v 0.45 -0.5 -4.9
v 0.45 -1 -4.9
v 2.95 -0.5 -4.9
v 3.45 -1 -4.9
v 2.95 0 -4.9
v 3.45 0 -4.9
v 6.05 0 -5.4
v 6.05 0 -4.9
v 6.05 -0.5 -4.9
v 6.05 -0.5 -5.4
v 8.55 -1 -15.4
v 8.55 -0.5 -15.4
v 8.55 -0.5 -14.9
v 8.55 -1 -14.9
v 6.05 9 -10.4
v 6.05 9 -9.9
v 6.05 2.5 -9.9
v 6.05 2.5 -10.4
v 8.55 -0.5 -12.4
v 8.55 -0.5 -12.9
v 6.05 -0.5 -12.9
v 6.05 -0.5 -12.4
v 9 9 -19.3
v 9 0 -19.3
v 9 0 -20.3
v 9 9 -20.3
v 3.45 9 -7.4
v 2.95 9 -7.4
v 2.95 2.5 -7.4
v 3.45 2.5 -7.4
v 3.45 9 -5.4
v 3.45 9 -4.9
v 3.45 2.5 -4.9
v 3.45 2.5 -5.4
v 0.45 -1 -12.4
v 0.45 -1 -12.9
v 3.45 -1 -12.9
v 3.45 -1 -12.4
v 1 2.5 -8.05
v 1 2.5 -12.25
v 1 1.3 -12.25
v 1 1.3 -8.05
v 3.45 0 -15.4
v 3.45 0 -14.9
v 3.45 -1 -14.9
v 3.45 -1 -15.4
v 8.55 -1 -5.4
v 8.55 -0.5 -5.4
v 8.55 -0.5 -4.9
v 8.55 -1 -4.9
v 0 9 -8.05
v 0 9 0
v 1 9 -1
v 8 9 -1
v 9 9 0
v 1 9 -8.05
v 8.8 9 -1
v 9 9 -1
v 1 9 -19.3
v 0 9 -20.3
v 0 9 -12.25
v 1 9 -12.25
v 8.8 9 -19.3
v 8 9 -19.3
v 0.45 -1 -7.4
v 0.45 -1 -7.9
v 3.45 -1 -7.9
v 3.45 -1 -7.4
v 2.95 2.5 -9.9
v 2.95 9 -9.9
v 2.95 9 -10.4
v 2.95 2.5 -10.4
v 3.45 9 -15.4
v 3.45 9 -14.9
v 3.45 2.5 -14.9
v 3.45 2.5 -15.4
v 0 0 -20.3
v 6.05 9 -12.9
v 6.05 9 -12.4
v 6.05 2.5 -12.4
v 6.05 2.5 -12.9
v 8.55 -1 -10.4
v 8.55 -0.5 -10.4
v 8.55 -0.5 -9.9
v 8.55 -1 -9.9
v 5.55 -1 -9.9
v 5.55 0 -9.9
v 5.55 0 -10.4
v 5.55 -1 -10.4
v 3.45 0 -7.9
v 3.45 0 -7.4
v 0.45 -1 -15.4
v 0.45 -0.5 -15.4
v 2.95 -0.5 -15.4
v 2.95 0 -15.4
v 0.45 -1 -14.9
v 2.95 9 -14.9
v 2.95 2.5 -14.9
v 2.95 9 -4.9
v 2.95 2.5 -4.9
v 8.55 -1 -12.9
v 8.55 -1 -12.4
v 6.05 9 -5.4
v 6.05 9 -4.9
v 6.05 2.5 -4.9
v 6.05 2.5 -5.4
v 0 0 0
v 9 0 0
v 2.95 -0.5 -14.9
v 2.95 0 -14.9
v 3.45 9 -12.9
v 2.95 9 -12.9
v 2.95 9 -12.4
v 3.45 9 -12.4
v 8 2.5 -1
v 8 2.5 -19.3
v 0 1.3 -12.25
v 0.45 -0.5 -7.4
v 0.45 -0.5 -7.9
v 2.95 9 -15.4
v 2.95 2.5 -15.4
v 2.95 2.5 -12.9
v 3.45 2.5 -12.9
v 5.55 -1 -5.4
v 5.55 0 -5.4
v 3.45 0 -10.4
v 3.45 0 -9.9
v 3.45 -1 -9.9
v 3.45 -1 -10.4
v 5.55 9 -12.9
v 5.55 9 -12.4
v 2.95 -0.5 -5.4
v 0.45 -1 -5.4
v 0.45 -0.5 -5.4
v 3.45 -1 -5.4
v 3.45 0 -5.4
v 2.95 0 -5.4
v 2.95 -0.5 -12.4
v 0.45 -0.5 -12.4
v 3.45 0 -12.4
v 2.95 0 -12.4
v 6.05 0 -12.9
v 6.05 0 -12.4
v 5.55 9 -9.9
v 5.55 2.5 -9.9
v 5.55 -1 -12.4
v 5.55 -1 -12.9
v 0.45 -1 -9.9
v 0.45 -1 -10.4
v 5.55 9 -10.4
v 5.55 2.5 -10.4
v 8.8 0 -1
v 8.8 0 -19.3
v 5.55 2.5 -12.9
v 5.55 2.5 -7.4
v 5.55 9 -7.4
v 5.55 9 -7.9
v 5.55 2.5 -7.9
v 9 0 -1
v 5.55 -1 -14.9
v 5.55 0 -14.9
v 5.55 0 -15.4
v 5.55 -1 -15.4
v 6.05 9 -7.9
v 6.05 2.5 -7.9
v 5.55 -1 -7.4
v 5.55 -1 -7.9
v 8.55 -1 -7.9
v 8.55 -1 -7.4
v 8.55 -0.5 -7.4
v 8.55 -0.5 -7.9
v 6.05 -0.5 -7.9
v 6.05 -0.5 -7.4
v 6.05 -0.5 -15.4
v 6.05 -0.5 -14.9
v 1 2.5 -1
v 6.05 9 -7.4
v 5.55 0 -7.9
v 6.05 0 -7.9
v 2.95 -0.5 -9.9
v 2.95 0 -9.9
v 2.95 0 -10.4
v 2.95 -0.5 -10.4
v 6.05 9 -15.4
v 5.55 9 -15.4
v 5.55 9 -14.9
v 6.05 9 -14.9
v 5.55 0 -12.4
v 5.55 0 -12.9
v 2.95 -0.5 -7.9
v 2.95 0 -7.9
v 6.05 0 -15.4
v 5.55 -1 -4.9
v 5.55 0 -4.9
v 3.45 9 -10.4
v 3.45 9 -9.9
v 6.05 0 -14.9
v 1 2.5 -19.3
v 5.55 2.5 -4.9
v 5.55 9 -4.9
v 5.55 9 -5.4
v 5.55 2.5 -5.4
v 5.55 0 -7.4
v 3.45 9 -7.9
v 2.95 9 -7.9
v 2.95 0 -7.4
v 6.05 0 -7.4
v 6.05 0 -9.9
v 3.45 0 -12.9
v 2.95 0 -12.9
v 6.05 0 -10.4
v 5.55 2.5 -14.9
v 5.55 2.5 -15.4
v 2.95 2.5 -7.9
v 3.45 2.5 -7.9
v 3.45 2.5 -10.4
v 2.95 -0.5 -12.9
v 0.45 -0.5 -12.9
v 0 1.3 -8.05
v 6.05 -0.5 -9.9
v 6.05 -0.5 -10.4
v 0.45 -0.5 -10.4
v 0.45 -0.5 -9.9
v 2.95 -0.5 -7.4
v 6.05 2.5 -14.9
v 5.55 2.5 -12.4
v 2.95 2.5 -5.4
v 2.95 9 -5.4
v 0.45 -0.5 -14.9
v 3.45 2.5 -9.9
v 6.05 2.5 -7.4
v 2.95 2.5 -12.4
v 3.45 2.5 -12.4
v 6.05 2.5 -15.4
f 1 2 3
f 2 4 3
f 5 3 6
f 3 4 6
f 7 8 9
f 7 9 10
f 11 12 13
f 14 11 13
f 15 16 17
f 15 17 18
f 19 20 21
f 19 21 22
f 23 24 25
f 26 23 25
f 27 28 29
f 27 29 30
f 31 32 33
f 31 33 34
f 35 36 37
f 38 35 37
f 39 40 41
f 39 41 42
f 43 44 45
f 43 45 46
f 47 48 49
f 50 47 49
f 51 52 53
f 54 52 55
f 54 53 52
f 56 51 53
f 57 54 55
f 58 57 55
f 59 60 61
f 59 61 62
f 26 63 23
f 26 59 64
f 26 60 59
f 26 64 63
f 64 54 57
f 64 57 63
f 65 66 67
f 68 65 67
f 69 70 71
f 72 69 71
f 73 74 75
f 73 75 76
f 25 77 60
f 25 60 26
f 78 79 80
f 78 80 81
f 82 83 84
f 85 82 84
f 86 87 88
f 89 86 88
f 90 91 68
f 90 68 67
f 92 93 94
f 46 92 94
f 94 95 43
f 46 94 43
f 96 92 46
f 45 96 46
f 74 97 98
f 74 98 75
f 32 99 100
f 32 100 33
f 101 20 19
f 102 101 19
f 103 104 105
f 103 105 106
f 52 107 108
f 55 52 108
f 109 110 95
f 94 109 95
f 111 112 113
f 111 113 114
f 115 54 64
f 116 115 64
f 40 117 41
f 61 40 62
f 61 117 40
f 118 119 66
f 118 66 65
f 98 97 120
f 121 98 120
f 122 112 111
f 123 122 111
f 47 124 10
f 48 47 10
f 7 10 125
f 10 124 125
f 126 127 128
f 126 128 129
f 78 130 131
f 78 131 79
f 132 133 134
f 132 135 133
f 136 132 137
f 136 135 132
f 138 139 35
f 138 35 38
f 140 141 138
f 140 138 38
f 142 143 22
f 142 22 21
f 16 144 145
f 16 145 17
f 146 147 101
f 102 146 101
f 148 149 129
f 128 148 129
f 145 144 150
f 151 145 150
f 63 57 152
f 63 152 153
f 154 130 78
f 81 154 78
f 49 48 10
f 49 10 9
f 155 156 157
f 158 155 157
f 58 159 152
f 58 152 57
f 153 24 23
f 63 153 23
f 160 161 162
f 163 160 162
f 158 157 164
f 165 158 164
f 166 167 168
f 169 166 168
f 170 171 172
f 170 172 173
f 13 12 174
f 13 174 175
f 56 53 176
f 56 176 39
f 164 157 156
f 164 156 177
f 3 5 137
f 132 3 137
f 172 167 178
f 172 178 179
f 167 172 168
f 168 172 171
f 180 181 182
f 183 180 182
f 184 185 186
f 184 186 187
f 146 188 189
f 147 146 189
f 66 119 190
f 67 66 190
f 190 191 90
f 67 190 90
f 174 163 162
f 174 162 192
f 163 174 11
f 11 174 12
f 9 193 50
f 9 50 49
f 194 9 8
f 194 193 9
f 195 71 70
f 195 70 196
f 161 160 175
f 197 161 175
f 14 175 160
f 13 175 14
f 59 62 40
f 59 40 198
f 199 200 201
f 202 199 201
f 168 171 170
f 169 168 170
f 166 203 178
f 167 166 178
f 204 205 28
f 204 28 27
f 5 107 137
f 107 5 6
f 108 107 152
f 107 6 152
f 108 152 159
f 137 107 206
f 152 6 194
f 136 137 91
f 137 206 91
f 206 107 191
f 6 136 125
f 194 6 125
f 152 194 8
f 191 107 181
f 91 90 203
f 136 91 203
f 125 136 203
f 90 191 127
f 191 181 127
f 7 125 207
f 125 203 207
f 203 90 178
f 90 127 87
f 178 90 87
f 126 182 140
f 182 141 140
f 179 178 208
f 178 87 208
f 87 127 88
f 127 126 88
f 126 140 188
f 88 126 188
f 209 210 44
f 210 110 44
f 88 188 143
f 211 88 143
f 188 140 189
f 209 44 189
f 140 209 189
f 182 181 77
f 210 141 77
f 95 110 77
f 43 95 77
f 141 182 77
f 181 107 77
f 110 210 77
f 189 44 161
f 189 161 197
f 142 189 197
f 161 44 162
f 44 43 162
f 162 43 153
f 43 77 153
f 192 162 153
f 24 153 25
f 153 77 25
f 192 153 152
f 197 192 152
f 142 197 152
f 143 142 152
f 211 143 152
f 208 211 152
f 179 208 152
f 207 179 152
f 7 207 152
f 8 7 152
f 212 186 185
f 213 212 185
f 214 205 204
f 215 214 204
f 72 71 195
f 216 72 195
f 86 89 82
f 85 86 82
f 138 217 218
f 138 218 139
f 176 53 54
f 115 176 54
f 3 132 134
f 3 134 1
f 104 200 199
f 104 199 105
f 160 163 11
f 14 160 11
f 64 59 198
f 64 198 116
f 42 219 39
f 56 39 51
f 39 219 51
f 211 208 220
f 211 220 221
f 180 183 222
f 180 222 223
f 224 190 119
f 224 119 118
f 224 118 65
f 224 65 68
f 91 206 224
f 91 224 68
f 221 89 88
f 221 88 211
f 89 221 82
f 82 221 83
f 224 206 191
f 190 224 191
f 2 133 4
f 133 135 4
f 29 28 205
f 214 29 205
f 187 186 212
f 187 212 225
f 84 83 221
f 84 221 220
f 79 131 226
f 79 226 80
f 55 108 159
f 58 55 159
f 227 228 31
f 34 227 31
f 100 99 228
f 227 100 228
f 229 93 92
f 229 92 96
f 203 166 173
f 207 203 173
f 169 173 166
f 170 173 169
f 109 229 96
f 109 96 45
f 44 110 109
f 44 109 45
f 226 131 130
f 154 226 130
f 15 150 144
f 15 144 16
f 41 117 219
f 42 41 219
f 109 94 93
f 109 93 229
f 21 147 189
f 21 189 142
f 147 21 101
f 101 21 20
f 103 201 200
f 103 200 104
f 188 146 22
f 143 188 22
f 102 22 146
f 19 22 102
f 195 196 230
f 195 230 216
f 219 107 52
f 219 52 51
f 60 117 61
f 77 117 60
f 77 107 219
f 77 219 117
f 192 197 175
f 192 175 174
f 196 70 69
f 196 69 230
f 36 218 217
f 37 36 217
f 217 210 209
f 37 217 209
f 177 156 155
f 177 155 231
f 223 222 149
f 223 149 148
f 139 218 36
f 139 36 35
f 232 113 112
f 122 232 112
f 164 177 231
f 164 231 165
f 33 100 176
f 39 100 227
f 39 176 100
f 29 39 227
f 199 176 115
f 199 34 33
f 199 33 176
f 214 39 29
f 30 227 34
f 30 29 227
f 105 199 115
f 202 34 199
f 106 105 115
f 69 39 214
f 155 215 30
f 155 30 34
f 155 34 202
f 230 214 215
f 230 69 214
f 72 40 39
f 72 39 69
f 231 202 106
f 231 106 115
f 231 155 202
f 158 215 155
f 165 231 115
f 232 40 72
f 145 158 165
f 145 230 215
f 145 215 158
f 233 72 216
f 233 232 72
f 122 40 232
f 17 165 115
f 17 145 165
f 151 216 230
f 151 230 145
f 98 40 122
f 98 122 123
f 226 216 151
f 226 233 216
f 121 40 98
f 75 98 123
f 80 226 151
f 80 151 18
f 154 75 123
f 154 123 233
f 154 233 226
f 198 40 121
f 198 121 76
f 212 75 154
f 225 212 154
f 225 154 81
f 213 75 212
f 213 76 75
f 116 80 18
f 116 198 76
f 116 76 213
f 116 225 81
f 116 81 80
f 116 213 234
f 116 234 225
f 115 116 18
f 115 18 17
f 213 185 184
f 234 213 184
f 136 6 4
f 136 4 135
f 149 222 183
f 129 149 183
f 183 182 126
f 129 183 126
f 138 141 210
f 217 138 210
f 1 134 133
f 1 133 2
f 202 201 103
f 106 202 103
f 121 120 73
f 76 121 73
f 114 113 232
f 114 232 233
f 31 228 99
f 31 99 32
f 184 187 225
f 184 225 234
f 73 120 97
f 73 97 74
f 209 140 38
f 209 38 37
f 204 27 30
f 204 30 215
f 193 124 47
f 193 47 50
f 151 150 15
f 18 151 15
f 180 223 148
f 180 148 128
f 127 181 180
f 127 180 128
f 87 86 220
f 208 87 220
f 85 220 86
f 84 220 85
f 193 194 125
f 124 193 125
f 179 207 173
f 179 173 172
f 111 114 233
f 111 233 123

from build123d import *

# Parameters (mm, degrees)
CROQUIS1_W              = 9
CROQUIS1_H              = 20.3
SALIENTE_EXTRUIR1_DEPTH = 9
CROQUIS2_W              = 7
CROQUIS2_H              = 18.3
CORTAR_EXTRUIR1_DEPTH   = 6.5
CROQUIS3_W              = 18.3
CROQUIS3_H              = 9
CORTAR_EXTRUIR2_DEPTH   = 0.2
CROQUIS4_W              = 4.2
CROQUIS4_H              = 7.7
CORTAR_EXTRUIR3_DEPTH   = 1
CROQUIS5_W              = 0.5
CROQUIS5_H              = 0.5
SALIENTE_EXTRUIR2_DEPTH = 10
CROQUIS6_W              = 0.5
CROQUIS6_H              = 0.5
SALIENTE_EXTRUIR3_DEPTH = 2.5


with BuildPart() as part:
    # Croquis1 → Saliente-Extruir1 (new body)
    with BuildSketch(Plane(origin=(0, 0, 0), x_dir=(1, 0, 0), z_dir=(0, 1, 0))):
        with Locations((4.5, 10.15)):
            Rectangle(CROQUIS1_W, CROQUIS1_H)
    extrude(amount=SALIENTE_EXTRUIR1_DEPTH)

    # Croquis2 → Cortar-Extruir1 (cut)
    with BuildSketch(Plane(origin=(0, 9, 0), x_dir=(1, 0, 0), z_dir=(0, 1, 0))):
        with Locations((4.5, 10.15)):
            Rectangle(CROQUIS2_W, CROQUIS2_H)
    extrude(amount=-CORTAR_EXTRUIR1_DEPTH, mode=Mode.SUBTRACT)

    # Croquis3 → Cortar-Extruir2 (cut)
    with BuildSketch(Plane(origin=(9, 0, 0), x_dir=(0, 0, -1), z_dir=(1, 0, 0))):
        with Locations((10.15, 4.5)):
            Rectangle(CROQUIS3_W, CROQUIS3_H)
    extrude(amount=-CORTAR_EXTRUIR2_DEPTH, mode=Mode.SUBTRACT)

    # Croquis4 → Cortar-Extruir3 (cut)
    with BuildSketch(Plane.ZY):
        with Locations((-10.15, 5.15)):
            Rectangle(CROQUIS4_W, CROQUIS4_H)
    extrude(amount=-CORTAR_EXTRUIR3_DEPTH, mode=Mode.SUBTRACT)

    # Croquis5 → Saliente-Extruir2 (add)
    with BuildSketch(Plane(origin=(0, 9, 0), x_dir=(1, 0, 0), z_dir=(0, 1, 0))):
        with Locations((5.8, 15.15)):
            Rectangle(CROQUIS5_W, CROQUIS5_H)
        with Locations((3.2, 15.15)):
            Rectangle(CROQUIS5_W, CROQUIS5_H)
        with Locations((5.8, 12.65)):
            Rectangle(CROQUIS5_W, CROQUIS5_H)
        with Locations((5.8, 10.15)):
            Rectangle(CROQUIS5_W, CROQUIS5_H)
        with Locations((5.8, 7.65)):
            Rectangle(CROQUIS5_W, CROQUIS5_H)
        with Locations((5.8, 5.15)):
            Rectangle(CROQUIS5_W, CROQUIS5_H)
        with Locations((3.2, 12.65)):
            Rectangle(CROQUIS5_W, CROQUIS5_H)
        with Locations((3.2, 10.15)):
            Rectangle(CROQUIS5_W, CROQUIS5_H)
        with Locations((3.2, 7.65)):
            Rectangle(CROQUIS5_W, CROQUIS5_H)
        with Locations((3.2, 5.15)):
            Rectangle(CROQUIS5_W, CROQUIS5_H)
    extrude(amount=-SALIENTE_EXTRUIR2_DEPTH)

    # Croquis6 → Saliente-Extruir3 (add)
    with BuildSketch(Plane.ZY.offset(-2.95)):
        with Locations((-5.15, -0.75)):
            Rectangle(CROQUIS6_W, CROQUIS6_H)
        with Locations((-7.65, -0.75)):
            Rectangle(CROQUIS6_W, CROQUIS6_H)
        with Locations((-10.15, -0.75)):
            Rectangle(CROQUIS6_W, CROQUIS6_H)
        with Locations((-12.65, -0.75)):
            Rectangle(CROQUIS6_W, CROQUIS6_H)
        with Locations((-15.15, -0.75)):
            Rectangle(CROQUIS6_W, CROQUIS6_H)
    saliente_extruir3 = extrude(amount=SALIENTE_EXTRUIR3_DEPTH)

    # Simetría1: Saliente-Extruir3 across plane
    add(saliente_extruir3.mirror(Plane(origin=(4.5, 0, 0), x_dir=(0, 0, 1), z_dir=(1, 0, 0))))


solid = part.part
